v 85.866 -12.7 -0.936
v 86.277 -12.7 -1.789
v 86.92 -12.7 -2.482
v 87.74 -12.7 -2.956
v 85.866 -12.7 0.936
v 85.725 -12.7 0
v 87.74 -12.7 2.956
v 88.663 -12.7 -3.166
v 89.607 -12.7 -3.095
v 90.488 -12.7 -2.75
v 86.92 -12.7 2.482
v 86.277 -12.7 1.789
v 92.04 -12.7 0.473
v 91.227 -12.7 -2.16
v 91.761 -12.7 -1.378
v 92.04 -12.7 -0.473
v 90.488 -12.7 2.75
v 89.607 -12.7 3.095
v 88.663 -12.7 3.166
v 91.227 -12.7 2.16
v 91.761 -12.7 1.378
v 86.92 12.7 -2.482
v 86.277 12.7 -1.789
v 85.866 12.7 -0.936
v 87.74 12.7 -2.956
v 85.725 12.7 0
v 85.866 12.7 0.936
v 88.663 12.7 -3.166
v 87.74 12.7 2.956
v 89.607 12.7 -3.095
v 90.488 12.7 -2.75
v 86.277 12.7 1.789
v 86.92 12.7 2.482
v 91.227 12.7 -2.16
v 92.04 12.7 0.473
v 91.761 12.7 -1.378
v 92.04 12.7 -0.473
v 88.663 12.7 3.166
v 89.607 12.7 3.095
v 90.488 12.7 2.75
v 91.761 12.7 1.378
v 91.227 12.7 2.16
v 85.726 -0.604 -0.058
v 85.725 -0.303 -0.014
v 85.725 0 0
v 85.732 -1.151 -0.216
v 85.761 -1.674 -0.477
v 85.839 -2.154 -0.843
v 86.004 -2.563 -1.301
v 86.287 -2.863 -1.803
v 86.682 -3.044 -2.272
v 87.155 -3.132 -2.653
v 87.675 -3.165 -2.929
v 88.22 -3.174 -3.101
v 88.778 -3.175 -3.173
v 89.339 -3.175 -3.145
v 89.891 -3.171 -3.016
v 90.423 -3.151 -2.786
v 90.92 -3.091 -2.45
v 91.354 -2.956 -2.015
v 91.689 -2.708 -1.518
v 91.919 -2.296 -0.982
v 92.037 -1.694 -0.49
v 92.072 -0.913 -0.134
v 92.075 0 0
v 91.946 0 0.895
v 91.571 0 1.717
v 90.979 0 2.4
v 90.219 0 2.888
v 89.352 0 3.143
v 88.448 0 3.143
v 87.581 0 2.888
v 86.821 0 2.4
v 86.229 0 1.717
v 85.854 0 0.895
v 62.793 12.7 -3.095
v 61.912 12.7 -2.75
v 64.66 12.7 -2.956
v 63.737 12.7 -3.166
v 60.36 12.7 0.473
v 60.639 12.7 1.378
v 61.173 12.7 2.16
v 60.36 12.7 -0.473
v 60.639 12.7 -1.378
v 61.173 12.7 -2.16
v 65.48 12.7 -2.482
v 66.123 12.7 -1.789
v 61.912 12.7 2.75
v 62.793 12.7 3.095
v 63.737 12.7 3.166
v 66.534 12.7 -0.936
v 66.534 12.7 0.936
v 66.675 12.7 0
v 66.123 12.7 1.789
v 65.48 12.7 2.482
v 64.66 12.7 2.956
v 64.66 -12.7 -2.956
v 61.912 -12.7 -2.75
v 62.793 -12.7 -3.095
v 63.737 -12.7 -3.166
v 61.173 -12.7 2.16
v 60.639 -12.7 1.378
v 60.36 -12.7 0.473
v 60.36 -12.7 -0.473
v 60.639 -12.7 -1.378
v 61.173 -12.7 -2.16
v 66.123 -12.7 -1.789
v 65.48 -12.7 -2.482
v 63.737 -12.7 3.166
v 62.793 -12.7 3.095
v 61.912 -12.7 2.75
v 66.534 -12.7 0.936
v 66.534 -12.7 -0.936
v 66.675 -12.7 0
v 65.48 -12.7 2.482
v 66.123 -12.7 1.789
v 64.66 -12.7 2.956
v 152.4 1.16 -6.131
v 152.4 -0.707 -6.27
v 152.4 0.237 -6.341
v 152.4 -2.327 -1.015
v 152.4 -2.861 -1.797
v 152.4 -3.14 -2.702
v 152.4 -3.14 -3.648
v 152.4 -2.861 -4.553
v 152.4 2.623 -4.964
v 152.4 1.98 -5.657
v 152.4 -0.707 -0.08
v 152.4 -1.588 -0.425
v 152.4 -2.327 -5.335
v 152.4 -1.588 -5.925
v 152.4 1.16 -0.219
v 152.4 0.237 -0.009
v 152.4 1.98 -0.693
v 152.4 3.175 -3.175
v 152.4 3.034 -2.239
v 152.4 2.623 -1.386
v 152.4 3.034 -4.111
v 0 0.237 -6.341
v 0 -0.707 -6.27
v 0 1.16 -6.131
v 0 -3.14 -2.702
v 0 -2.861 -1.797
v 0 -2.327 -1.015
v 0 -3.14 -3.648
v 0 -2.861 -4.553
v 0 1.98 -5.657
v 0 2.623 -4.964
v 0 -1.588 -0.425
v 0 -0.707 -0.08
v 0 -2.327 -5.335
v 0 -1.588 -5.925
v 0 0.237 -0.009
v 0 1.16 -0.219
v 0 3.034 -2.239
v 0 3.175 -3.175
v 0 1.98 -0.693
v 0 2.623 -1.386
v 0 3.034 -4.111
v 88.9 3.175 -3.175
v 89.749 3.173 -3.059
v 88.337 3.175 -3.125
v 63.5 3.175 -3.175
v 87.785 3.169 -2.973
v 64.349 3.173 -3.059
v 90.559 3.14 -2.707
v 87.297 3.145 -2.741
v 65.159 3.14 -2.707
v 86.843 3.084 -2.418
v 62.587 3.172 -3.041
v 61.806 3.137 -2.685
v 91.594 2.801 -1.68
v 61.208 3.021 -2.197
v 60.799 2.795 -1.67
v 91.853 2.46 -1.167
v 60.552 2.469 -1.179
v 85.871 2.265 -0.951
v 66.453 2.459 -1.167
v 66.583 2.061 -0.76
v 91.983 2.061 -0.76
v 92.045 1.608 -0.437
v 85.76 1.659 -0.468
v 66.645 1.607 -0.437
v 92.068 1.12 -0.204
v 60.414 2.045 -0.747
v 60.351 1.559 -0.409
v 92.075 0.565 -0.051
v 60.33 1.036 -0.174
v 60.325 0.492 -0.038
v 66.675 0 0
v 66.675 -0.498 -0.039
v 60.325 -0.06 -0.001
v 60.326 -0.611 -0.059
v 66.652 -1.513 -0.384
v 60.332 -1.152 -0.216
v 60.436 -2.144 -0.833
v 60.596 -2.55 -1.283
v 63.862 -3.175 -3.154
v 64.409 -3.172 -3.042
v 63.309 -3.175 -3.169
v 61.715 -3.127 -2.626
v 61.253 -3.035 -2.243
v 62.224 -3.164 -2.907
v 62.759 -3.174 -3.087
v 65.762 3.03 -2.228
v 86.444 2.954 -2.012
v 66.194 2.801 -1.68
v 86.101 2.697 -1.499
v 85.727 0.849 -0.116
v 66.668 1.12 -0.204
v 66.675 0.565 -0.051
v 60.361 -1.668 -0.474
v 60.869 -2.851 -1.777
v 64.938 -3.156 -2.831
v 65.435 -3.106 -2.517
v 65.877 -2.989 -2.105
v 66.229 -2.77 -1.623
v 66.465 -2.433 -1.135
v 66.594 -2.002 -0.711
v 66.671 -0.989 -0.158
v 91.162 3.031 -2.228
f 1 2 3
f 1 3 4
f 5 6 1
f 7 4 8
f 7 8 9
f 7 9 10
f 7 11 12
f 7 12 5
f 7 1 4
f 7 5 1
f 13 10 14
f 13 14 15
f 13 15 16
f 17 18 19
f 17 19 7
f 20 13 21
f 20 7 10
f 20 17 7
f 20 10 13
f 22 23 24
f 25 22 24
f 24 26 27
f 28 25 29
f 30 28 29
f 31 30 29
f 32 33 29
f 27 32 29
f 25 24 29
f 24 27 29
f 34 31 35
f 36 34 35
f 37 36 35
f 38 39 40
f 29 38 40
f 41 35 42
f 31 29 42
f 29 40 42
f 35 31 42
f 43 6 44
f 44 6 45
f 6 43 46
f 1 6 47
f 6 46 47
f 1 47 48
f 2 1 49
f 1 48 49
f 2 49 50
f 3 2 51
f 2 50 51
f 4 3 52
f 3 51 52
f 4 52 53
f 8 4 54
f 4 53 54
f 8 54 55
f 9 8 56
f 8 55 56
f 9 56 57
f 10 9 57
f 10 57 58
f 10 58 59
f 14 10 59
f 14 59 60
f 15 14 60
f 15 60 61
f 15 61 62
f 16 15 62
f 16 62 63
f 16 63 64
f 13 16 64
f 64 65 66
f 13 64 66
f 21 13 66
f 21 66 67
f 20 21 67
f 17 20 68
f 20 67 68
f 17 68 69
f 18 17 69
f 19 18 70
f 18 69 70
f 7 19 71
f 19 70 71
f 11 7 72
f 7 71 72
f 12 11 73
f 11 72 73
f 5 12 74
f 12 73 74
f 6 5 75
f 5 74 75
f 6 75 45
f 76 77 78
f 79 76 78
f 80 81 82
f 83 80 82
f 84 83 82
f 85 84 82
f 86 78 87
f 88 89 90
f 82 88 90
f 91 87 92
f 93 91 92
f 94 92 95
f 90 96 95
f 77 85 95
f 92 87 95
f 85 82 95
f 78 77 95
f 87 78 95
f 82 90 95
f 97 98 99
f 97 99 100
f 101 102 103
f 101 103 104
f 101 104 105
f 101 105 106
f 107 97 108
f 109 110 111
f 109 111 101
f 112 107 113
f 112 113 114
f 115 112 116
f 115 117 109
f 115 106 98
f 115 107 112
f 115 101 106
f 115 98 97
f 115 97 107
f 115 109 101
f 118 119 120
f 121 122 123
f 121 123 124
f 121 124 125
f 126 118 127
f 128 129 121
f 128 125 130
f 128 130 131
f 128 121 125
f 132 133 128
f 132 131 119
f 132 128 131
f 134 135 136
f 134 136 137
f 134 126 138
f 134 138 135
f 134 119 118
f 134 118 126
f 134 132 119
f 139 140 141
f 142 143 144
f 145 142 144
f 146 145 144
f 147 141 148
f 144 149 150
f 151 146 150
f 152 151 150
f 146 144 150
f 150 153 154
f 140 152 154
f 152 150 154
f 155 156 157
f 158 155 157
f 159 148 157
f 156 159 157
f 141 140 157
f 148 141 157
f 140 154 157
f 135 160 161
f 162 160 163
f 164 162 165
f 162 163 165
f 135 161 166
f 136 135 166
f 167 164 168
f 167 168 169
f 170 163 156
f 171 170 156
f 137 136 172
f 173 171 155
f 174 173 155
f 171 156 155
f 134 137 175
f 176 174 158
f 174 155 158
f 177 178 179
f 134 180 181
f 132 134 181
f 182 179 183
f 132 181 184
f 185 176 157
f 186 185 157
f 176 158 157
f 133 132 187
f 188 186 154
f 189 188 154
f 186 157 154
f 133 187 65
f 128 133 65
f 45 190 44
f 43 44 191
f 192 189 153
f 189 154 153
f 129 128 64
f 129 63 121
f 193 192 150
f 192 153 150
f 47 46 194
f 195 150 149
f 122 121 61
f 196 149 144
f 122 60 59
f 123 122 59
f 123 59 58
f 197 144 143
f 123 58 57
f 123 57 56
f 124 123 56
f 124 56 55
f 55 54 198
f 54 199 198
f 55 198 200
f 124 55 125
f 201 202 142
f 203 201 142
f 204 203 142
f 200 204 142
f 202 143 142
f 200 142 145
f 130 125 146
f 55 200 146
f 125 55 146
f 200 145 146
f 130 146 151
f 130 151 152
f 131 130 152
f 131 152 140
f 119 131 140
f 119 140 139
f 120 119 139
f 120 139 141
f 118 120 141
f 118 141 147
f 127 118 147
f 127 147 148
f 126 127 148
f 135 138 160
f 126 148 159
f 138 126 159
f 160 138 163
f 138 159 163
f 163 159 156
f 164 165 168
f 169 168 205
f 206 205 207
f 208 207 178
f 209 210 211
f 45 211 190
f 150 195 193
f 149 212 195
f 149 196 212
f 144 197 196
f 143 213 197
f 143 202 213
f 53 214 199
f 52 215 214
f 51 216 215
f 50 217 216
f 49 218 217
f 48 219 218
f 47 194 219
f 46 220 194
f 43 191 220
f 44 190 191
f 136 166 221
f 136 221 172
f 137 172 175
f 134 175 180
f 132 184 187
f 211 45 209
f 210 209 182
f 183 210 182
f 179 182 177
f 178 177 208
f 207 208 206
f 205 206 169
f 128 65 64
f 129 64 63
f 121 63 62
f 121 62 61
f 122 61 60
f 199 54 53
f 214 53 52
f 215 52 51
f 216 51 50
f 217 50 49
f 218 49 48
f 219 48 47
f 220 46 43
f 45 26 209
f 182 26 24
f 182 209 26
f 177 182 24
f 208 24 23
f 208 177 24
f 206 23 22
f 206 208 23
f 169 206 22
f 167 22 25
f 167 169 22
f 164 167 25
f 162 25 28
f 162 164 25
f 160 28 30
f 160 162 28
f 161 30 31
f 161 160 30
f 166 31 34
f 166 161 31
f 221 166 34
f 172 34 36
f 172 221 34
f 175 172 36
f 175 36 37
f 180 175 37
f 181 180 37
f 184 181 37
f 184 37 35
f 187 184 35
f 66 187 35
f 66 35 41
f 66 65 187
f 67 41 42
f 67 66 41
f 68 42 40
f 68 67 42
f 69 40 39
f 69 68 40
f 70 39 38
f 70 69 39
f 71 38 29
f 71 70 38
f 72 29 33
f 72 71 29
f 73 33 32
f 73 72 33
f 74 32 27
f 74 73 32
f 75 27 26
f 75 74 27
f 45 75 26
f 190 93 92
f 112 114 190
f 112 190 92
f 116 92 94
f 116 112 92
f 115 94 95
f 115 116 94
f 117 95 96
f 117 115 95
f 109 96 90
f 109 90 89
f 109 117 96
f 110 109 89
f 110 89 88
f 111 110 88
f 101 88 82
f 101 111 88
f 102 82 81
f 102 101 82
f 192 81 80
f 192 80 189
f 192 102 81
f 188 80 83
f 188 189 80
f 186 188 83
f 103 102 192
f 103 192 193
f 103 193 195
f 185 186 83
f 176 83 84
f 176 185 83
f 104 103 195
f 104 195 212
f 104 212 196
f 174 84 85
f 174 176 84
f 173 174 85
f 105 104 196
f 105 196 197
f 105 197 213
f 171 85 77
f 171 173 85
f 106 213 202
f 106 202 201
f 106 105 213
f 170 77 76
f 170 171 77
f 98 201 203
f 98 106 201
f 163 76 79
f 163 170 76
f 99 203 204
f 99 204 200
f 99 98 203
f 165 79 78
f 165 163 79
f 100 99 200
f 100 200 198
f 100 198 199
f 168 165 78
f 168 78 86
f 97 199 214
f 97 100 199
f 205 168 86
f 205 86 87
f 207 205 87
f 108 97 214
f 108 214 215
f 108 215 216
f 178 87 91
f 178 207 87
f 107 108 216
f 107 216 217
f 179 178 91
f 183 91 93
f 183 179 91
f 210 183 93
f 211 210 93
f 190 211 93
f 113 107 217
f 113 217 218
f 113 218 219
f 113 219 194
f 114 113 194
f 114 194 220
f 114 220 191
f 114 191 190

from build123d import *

# Parameters (mm, degrees)
F0_R     = 3.175
F1_DEPTH = 152.4
F2_R     = 3.175
F3_DEPTH = 12.7


# Not quite as in the source:
# - a feature names something its author has since deleted; it is built from what else it names


with BuildPart() as f1:
    # F0 (on Right) → F1 (new body)
    with BuildSketch(Plane.YZ):
        with Locations((0, -3.175)):
            Circle(F0_R)
    extrude(amount=F1_DEPTH)

    # F2 (on Front) → F3 (join, symmetric)
    with BuildSketch(Plane.XZ):
        with BuildLine():
            ThreePointArc((92.075, 0), (88.9, 3.175), (85.725, 0))
            ThreePointArc((85.725, 0), (88.9, -3.175), (92.075, 0))
        make_face()
        with Locations((63.5, 0)):
            Circle(F2_R)
    extrude(amount=F3_DEPTH, both=True)


solid = f1.part
